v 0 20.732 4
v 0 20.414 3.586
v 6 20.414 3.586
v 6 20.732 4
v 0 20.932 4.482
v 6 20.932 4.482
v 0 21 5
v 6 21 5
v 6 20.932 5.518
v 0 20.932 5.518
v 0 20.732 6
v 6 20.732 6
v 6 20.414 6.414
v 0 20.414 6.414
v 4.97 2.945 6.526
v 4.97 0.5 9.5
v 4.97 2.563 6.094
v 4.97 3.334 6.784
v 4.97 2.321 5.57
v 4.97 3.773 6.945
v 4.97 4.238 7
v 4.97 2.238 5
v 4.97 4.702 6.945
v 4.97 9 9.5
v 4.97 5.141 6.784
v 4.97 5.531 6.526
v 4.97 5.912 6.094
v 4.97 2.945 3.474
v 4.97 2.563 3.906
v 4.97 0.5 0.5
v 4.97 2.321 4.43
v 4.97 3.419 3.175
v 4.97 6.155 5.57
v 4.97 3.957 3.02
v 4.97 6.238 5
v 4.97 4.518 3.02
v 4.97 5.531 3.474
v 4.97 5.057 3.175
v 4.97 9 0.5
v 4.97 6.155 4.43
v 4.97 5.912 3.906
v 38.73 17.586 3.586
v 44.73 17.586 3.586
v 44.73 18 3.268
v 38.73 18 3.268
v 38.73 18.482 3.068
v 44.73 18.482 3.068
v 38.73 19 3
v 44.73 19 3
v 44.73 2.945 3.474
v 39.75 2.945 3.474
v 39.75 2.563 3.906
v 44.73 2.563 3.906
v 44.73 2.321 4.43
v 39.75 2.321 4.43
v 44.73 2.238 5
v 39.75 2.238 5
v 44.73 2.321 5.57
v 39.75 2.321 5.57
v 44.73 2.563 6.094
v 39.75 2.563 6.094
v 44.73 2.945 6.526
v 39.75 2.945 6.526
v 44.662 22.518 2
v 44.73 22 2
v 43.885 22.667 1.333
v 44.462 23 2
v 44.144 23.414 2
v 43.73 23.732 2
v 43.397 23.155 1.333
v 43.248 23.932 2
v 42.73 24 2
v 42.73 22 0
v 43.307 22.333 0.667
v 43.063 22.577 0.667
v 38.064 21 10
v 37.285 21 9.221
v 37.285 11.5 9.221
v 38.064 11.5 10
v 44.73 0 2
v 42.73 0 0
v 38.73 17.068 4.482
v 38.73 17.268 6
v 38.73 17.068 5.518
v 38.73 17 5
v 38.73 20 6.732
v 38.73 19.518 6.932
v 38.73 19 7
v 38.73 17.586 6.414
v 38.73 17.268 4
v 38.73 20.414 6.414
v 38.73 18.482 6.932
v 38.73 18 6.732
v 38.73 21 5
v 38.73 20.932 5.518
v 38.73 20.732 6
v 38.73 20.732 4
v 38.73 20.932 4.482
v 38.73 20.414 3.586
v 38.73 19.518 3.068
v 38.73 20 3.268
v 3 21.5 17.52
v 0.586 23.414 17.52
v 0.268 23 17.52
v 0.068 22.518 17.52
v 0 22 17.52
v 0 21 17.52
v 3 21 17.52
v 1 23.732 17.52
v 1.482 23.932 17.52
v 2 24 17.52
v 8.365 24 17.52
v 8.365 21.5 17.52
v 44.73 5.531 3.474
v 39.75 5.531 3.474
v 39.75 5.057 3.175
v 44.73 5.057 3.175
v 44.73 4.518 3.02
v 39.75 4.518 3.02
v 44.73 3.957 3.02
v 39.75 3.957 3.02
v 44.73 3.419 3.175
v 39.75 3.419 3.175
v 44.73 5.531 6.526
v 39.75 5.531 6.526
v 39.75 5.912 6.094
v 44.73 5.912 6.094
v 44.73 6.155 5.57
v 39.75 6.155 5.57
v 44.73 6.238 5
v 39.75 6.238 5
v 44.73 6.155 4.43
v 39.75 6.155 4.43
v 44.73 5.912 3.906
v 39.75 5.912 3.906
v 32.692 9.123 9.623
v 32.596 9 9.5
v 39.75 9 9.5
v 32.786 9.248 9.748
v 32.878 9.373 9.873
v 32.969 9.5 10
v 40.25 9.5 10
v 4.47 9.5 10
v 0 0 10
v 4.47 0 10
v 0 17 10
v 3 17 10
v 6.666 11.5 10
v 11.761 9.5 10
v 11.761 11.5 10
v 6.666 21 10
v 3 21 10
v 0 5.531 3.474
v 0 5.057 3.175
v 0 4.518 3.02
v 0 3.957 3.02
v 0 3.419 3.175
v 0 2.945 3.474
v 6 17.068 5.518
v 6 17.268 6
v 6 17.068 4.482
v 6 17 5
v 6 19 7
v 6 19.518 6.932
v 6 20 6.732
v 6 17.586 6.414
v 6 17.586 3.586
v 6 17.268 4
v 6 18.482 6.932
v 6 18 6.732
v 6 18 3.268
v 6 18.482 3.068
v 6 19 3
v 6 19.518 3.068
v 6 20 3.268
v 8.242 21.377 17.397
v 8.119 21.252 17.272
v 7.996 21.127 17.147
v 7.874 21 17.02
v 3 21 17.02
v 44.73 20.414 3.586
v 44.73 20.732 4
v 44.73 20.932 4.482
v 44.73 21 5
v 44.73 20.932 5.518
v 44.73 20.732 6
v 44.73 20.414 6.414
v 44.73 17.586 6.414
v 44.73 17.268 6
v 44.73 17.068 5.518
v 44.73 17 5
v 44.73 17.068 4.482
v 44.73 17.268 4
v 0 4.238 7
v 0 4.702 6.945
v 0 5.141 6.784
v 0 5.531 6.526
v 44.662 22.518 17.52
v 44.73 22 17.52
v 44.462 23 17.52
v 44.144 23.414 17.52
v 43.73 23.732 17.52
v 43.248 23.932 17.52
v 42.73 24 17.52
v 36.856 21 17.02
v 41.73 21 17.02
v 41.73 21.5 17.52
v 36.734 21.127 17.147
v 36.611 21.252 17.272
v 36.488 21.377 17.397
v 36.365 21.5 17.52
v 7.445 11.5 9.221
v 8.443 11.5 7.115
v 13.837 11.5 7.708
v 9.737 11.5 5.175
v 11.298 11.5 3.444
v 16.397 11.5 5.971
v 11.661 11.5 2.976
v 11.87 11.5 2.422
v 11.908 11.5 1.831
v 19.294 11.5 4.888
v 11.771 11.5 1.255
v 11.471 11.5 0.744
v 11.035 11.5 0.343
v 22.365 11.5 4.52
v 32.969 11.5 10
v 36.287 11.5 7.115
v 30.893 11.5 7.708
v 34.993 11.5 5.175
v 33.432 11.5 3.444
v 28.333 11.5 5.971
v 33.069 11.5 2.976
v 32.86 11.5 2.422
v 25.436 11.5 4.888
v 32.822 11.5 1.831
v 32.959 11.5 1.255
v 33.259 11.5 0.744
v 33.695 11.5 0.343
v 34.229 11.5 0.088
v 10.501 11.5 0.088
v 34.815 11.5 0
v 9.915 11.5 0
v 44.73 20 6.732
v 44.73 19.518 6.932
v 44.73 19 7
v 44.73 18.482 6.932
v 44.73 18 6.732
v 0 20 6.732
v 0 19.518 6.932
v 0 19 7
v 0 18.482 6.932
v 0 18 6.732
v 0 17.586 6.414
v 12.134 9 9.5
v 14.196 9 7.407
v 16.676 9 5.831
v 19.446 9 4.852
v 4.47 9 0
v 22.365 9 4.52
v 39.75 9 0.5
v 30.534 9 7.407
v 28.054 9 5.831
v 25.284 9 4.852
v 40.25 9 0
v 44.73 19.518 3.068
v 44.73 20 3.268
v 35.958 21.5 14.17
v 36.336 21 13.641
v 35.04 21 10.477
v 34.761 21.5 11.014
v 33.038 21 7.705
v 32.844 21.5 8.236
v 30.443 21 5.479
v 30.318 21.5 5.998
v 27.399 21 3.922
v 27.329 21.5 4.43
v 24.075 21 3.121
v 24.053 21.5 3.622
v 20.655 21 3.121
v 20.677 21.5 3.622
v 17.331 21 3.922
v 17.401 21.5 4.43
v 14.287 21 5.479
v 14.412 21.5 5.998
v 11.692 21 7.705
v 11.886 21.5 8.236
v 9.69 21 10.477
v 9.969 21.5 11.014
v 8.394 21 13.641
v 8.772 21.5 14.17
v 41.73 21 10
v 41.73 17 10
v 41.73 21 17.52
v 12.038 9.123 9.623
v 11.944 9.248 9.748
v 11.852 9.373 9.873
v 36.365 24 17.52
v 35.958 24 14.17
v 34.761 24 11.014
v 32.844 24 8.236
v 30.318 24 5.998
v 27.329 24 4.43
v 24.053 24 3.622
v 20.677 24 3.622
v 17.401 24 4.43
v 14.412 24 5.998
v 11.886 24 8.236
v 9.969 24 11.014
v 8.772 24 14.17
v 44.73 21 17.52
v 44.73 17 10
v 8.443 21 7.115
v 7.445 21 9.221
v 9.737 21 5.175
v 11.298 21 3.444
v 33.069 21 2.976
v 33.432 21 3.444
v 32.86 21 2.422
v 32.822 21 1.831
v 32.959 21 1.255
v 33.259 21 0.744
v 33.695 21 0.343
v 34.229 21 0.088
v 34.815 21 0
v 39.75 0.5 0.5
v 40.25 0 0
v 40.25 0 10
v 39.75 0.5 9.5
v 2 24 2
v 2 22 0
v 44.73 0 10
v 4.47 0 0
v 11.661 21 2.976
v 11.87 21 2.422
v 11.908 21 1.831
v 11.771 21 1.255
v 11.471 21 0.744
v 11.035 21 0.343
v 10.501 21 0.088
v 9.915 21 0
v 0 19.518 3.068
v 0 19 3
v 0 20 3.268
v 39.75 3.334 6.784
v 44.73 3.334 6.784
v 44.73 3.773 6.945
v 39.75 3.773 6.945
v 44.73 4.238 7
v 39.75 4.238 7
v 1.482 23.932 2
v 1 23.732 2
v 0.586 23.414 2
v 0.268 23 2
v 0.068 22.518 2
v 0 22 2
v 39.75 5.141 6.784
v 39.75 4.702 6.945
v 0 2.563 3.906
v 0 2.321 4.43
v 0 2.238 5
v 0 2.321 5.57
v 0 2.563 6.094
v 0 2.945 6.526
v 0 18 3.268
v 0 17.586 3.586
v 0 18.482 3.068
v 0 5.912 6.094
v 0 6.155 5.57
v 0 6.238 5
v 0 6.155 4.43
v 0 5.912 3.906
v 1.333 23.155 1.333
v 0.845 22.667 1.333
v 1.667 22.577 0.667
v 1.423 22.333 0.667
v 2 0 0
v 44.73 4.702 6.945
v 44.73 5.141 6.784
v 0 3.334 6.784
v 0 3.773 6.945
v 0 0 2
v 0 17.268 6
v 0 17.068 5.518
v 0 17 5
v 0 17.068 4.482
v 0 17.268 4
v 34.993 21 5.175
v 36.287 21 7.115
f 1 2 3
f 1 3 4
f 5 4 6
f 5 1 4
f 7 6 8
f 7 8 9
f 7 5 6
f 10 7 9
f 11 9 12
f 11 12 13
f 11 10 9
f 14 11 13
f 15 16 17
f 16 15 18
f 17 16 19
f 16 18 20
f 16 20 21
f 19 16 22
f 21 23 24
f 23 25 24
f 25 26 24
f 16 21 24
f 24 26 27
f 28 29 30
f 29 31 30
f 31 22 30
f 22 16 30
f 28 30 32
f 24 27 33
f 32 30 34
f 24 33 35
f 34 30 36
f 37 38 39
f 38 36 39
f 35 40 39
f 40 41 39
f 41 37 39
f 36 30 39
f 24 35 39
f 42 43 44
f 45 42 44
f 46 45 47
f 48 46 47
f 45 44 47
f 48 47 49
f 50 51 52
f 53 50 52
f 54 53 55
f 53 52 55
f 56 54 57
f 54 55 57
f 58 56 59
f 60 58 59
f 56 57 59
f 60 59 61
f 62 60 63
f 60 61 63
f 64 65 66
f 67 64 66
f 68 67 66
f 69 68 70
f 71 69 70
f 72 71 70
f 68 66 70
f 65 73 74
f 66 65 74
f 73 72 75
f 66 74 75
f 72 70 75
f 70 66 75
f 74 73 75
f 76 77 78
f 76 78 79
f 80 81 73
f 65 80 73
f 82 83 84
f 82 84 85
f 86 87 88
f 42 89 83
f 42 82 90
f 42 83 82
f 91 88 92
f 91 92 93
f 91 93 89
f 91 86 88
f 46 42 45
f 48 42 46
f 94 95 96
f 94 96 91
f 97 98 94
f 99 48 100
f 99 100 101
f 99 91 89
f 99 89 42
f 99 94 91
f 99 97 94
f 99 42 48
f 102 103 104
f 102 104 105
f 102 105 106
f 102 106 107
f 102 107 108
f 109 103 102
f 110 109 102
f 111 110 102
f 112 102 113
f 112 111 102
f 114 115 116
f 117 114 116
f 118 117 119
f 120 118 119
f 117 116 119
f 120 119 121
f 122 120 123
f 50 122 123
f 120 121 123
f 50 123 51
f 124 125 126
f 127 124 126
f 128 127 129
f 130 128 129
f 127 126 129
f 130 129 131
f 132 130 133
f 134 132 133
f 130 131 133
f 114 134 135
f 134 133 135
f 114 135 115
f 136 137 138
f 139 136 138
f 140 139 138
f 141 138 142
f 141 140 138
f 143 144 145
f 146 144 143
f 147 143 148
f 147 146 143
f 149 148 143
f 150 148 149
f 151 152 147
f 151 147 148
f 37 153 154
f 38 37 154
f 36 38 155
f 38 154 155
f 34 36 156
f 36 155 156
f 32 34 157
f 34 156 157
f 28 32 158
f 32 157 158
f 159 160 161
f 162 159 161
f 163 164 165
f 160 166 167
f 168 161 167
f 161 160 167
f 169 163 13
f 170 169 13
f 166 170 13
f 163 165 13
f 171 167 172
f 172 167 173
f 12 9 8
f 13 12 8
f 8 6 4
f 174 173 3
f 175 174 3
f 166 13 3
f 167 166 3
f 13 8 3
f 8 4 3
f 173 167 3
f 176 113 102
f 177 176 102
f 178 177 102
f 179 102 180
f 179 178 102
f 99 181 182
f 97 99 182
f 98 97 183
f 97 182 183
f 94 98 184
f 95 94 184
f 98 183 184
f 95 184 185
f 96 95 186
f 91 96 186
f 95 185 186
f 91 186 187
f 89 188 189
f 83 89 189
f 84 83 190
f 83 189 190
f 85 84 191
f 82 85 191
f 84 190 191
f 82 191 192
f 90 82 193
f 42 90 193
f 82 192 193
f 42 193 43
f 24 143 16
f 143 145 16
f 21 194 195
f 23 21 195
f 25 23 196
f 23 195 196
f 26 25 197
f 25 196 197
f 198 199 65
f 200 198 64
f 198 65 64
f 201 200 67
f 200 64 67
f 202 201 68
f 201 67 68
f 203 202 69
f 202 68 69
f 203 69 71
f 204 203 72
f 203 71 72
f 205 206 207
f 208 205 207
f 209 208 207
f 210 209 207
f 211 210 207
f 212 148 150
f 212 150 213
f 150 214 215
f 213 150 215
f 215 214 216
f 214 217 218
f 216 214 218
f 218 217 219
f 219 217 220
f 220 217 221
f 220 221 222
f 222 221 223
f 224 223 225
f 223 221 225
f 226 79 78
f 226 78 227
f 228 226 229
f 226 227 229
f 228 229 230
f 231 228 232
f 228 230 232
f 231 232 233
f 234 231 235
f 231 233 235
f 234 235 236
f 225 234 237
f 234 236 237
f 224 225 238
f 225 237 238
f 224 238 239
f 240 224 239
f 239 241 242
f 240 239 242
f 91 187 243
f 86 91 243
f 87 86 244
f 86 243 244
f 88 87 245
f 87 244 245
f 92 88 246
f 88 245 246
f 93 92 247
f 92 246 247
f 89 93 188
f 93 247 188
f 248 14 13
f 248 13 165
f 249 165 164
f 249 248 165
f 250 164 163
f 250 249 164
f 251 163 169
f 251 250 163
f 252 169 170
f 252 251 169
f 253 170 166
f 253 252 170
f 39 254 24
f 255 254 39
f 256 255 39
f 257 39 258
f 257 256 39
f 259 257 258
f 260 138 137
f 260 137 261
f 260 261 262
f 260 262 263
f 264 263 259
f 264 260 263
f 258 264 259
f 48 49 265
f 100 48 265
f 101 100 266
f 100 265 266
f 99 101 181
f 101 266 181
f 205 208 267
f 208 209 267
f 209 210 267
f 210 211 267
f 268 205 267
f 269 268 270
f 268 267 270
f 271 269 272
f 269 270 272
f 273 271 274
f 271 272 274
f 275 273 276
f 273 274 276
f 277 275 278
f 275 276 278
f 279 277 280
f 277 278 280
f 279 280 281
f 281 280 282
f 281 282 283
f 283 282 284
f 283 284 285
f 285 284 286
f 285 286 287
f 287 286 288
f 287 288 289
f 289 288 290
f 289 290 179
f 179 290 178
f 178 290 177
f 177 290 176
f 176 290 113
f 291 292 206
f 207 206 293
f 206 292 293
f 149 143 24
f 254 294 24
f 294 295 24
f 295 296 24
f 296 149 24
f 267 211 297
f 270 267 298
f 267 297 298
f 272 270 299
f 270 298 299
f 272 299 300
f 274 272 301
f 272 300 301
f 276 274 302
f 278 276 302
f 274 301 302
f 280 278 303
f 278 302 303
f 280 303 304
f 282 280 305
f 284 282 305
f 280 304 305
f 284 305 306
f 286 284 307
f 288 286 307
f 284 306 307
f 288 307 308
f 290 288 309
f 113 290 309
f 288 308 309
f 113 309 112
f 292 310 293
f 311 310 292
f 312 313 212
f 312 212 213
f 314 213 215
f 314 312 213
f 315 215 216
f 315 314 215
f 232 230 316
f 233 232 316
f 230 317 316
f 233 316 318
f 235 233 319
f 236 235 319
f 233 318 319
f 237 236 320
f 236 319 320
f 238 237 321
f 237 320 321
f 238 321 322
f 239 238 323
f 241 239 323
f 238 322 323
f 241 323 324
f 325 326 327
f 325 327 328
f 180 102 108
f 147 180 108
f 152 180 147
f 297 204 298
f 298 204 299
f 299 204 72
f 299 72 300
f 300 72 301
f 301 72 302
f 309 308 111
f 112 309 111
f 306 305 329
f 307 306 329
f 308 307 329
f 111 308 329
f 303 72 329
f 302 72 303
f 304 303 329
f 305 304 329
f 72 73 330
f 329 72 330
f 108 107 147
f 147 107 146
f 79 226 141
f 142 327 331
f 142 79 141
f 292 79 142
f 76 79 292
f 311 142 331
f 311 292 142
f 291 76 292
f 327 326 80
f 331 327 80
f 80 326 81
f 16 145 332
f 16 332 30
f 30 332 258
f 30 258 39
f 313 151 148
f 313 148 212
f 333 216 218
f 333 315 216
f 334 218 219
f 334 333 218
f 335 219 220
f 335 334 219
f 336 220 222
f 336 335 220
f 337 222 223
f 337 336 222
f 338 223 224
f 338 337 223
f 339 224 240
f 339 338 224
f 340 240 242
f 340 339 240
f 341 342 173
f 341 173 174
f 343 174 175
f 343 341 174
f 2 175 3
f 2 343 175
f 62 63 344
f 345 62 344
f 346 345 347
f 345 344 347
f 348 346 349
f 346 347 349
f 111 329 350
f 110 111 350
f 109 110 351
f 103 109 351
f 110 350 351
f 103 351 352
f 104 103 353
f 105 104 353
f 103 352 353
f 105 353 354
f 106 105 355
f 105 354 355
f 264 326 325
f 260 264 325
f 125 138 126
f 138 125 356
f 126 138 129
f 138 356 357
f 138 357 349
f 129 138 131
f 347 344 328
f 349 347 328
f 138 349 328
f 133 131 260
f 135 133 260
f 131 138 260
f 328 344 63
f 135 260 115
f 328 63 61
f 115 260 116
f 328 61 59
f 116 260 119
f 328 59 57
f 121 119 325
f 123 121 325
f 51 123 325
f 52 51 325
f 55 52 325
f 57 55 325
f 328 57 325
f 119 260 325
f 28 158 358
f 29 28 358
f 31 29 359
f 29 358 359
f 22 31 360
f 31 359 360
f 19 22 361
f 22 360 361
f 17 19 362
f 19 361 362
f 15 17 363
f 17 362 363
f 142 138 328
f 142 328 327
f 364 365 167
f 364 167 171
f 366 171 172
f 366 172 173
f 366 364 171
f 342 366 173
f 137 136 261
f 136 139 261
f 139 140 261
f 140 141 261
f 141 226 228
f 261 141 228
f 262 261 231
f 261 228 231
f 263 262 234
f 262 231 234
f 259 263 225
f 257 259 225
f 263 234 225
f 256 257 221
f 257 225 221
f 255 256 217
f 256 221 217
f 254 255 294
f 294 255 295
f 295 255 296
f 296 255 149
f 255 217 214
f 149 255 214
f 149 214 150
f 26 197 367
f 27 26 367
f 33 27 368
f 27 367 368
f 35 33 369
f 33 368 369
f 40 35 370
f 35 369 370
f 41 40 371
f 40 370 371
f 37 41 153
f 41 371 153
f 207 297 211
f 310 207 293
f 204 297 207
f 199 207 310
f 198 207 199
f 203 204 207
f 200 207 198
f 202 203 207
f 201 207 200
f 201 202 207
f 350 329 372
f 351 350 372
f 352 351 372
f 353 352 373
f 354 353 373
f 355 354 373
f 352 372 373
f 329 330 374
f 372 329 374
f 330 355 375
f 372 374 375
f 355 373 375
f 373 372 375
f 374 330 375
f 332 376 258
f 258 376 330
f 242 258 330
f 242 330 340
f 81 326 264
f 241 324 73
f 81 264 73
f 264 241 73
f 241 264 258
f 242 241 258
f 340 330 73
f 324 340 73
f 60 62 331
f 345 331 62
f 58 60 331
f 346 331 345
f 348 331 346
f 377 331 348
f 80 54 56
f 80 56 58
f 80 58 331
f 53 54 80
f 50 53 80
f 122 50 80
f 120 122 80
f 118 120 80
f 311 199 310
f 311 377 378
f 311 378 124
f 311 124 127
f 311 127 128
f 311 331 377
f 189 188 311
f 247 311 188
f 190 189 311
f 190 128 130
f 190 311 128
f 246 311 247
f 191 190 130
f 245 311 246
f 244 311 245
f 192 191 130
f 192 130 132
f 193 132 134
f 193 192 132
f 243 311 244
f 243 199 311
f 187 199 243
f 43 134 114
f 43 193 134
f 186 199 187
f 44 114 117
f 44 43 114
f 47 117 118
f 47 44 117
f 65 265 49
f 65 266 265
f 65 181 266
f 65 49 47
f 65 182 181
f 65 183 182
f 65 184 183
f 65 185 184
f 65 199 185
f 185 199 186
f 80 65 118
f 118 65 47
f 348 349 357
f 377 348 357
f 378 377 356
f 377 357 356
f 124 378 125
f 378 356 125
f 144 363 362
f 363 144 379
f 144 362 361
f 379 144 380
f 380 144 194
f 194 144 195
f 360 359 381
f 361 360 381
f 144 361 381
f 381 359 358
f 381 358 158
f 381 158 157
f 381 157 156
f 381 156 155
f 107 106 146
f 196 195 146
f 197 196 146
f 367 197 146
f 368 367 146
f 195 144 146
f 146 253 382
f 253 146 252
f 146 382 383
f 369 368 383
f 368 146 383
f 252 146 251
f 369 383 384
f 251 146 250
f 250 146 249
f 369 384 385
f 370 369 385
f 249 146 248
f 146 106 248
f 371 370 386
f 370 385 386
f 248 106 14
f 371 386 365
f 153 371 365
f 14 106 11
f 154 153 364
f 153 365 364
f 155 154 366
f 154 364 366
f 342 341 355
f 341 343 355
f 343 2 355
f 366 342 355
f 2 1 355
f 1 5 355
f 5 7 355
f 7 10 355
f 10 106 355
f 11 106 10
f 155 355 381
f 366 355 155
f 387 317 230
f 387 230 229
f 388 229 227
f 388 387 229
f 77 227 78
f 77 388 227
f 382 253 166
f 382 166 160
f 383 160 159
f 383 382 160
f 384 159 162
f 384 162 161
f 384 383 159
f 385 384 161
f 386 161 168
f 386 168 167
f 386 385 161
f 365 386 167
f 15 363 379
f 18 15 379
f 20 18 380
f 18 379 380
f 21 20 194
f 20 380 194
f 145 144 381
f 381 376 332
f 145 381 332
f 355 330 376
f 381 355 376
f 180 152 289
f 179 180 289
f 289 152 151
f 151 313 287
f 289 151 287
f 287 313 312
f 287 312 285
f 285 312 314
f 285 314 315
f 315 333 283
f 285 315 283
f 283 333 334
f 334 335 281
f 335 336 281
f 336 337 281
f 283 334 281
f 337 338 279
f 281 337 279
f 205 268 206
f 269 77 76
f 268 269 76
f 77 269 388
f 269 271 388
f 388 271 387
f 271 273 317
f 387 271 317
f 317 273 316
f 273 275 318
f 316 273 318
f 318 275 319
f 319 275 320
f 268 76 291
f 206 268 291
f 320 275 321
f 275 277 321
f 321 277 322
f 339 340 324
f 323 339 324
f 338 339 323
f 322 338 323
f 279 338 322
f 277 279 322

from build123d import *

# Parameters (mm, degrees)
EXTRUDE_1_DEPTH     = 10
SKETCH_2_W          = 16
SKETCH_2_H          = 9.5
EXTRUDE_2_DEPTH     = 17.52
CUT_EXTRUDE_1_DEPTH = 3
CUT_EXTRUDE_2_DEPTH = 2.5
EXTRUDE_3_DEPTH     = 3
EXTRUDE_4_DEPTH     = 3
FILLET_1_R          = 2
CHAMFER_1_SIZE      = 2
CUT_EXTRUDE_3_DEPTH = 6
CUT_EXTRUDE_4_REACH = 55.7
CHAMFER_2_SIZE      = 0.5
FILLET_2_R          = 2


# Some blends are built 0.0001 mm under size
with BuildPart() as part:
    # 草图1 → 凸台-拉伸1 (new body)
    with BuildSketch(Plane.XY):
        Polygon((0, 0), (4.97, 0), (4.97, 9), (39.75, 9), (39.75, 0), (44.73, 0), (44.73, 24), (0, 24), align=None)
    extrude(amount=EXTRUDE_1_DEPTH)

    # 草图2 → 切除-旋转2 (revolve, cut)
    with BuildSketch(Plane(origin=(0, 0, 15), x_dir=(-1, 0, 0), z_dir=(0, 0, -1))):
        with Locations((-14.365, 16.25)):
            Rectangle(SKETCH_2_W, SKETCH_2_H)
    revolve(axis=Axis((22.365, 28.168186047, 15), (0, -1, 0)), mode=Mode.SUBTRACT)

    # 草图4 → 凸台-拉伸2 (add)
    with BuildSketch(Plane(origin=(0, 0, 0), x_dir=(-1, 0, 0), z_dir=(0, 0, -1))):
        Polygon((-44.73, 24), (0, 24), (0, 21), (-7.166315846, 21), (-37.563684154, 21), (-44.73, 21), align=None)
    extrude(amount=-EXTRUDE_2_DEPTH)

    # 草图5 → 切除-拉伸1 (cut)
    with BuildSketch(Plane(origin=(0, 24, 0), x_dir=(1, 0, 0), z_dir=(0, 1, 0))):
        with BuildLine():
            Line((8.365, -17.52), (36.365, -17.52))
            ThreePointArc((36.365, -17.52), (22.365, -3.52), (8.365, -17.52))
        make_face()
    extrude(amount=-CUT_EXTRUDE_1_DEPTH, mode=Mode.SUBTRACT)

    # 草图6 → 切除-拉伸2 (cut)
    with BuildSketch(Plane(origin=(0, 11.5, 0), x_dir=(1, 0, 0), z_dir=(0, 1, 0))):
        with BuildLine():
            ThreePointArc((32.969225573, -10), (22.365, -4.52), (11.760774427, -10))
            Line((11.760774427, -10), (32.969225573, -10))
        make_face()
    extrude(amount=-CUT_EXTRUDE_2_DEPTH, mode=Mode.SUBTRACT)

    # 草图7 → 凸台-拉伸3 (add)
    with BuildSketch(Plane.ZY):
        Polygon((10, 17), (10, 21), (17.52, 21), align=None)
    extrude(amount=-EXTRUDE_3_DEPTH)

    # 草图8 → 凸台-拉伸4 (add)
    with BuildSketch(Plane(origin=(44.73, 0, 0), x_dir=(0, 0, -1), z_dir=(1, 0, 0))):
        Polygon((-17.52, 21), (-10, 17), (-10, 21), align=None)
    extrude(amount=-EXTRUDE_4_DEPTH)

    # 圆角1
    fillet_1_edges = [part.edges().sort_by_distance(p)[0] for p in [
        (0, 24, 8.76),
        (44.73, 24, 8.76),
    ]]
    fillet(fillet_1_edges, radius=FILLET_1_R)

    # 倒角1
    chamfer_1_edges = [part.edges().sort_by_distance(p)[0] for p in [
        (22.365, 24, 0),
        (0, 11, 0),
        (0.585786438, 23.414213562, 0),
        (44.144213562, 23.414213562, 0),
        (44.73, 11, 0),
    ]]
    chamfer(chamfer_1_edges, length=CHAMFER_1_SIZE - 0.0001)  # a hair under: the kernel refuses the full size

    # 草图9 → 切除-拉伸3 (cut)
    with BuildSketch(Plane(origin=(44.73, 0, 0), x_dir=(0, 0, -1), z_dir=(1, 0, 0))):
        with BuildLine():
            ThreePointArc((-6.414213562, 17.585786438), (-5, 17), (-3.585786438, 17.585786438))
            Line((-3.585786438, 17.585786438), (-5, 19))
            Line((-5, 19), (-6.414213562, 17.585786438))
        make_face()
        with BuildLine():
            Line((-5, 19), (-3.585786438, 17.585786438))
            ThreePointArc((-3.585786438, 17.585786438), (-3.152240935, 18.234633135), (-3, 19))
            ThreePointArc((-3, 19), (-3.152240935, 19.765366865), (-3.585786438, 20.414213562))
            Line((-3.585786438, 20.414213562), (-5, 19))
        make_face()
        with BuildLine():
            ThreePointArc((-6.414213562, 20.414213562), (-7, 19), (-6.414213562, 17.585786438))
            Line((-6.414213562, 17.585786438), (-5, 19))
            Line((-5, 19), (-6.414213562, 20.414213562))
        make_face()
        with BuildLine():
            Line((-6.414213562, 20.414213562), (-5, 19))
            Line((-5, 19), (-3.585786438, 20.414213562))
            ThreePointArc((-3.585786438, 20.414213562), (-5, 21), (-6.414213562, 20.414213562))
        make_face()
    cut_extrude_3 = extrude(amount=-CUT_EXTRUDE_3_DEPTH, mode=Mode.SUBTRACT)

    # 镜向1: 切除-拉伸3 across plane
    add(cut_extrude_3.mirror(Plane(origin=(22.365, 0, 0), x_dir=(0, 0, 1), z_dir=(1, 0, 0))), mode=Mode.SUBTRACT)

    # 切除-拉伸4: up to this face of the body (flat: up to its plane)
    cut_extrude_4_end = Plane(part.part.faces().sort_by_distance((44.73, 11.584828714, 6.907402267))[0])
    # 草图10 → 切除-拉伸4 (cut, up to the picked face)
    with BuildSketch(Plane.ZY, mode=Mode.PRIVATE) as cut_extrude_4_sk1:
        with BuildLine():
            ThreePointArc((3.474277506, 2.944620168), (5, 2.237744629), (6.525722494, 2.944620168))
            Line((6.525722494, 2.944620168), (5, 4.237744629))
            Line((5, 4.237744629), (3.474277506, 2.944620168))
        make_face()
    cut_extrude_4_tool1 = split(extrude(cut_extrude_4_sk1.sketch, amount=-CUT_EXTRUDE_4_REACH, mode=Mode.PRIVATE), bisect_by=cut_extrude_4_end, keep=Keep.BOTH, mode=Mode.PRIVATE)
    # 草图10 → 切除-拉伸4 (cut, up to the picked face)
    with BuildSketch(Plane.ZY, mode=Mode.PRIVATE) as cut_extrude_4_sk2:
        with BuildLine():
            Line((5, 4.237744629), (6.525722494, 2.944620168))
            ThreePointArc((6.525722494, 2.944620168), (6.877690734, 3.549066543), (7, 4.237744629))
            ThreePointArc((7, 4.237744629), (6.877690734, 4.926422715), (6.525722494, 5.53086909))
            Line((6.525722494, 5.53086909), (5, 4.237744629))
        make_face()
    cut_extrude_4_tool2 = split(extrude(cut_extrude_4_sk2.sketch, amount=-CUT_EXTRUDE_4_REACH, mode=Mode.PRIVATE), bisect_by=cut_extrude_4_end, keep=Keep.BOTH, mode=Mode.PRIVATE)
    # 草图10 → 切除-拉伸4 (cut, up to the picked face)
    with BuildSketch(Plane.ZY, mode=Mode.PRIVATE) as cut_extrude_4_sk3:
        with BuildLine():
            ThreePointArc((3.474277506, 5.53086909), (3, 4.237744629), (3.474277506, 2.944620168))
            Line((3.474277506, 2.944620168), (5, 4.237744629))
            Line((5, 4.237744629), (3.474277506, 5.53086909))
        make_face()
    cut_extrude_4_tool3 = split(extrude(cut_extrude_4_sk3.sketch, amount=-CUT_EXTRUDE_4_REACH, mode=Mode.PRIVATE), bisect_by=cut_extrude_4_end, keep=Keep.BOTH, mode=Mode.PRIVATE)
    # 草图10 → 切除-拉伸4 (cut, up to the picked face)
    with BuildSketch(Plane.ZY, mode=Mode.PRIVATE) as cut_extrude_4_sk4:
        with BuildLine():
            Line((5, 4.237744629), (6.525722494, 5.53086909))
            ThreePointArc((6.525722494, 5.53086909), (5, 6.237744629), (3.474277506, 5.53086909))
            Line((3.474277506, 5.53086909), (5, 4.237744629))
        make_face()
    cut_extrude_4_tool4 = split(extrude(cut_extrude_4_sk4.sketch, amount=-CUT_EXTRUDE_4_REACH, mode=Mode.PRIVATE), bisect_by=cut_extrude_4_end, keep=Keep.BOTH, mode=Mode.PRIVATE)
    # 草图10 → 切除-拉伸4 (cut, up to the picked face)
    with BuildSketch(Plane.ZY, mode=Mode.PRIVATE) as cut_extrude_4_sk5:
        with BuildLine():
            ThreePointArc((3.474277506, 2.944620168), (5, 2.237744629), (6.525722494, 2.944620168))
            Line((6.525722494, 2.944620168), (5, 4.237744629))
            Line((5, 4.237744629), (3.474277506, 2.944620168))
        make_face()
    cut_extrude_4_tool5 = split(extrude(cut_extrude_4_sk5.sketch, amount=-CUT_EXTRUDE_4_REACH, mode=Mode.PRIVATE), bisect_by=cut_extrude_4_end, keep=Keep.BOTH, mode=Mode.PRIVATE)
    # 草图10 → 切除-拉伸4 (cut, up to the picked face)
    with BuildSketch(Plane.ZY, mode=Mode.PRIVATE) as cut_extrude_4_sk6:
        with BuildLine():
            Line((5, 4.237744629), (6.525722494, 2.944620168))
            ThreePointArc((6.525722494, 2.944620168), (6.877690734, 3.549066543), (7, 4.237744629))
            ThreePointArc((7, 4.237744629), (6.877690734, 4.926422715), (6.525722494, 5.53086909))
            Line((6.525722494, 5.53086909), (5, 4.237744629))
        make_face()
    cut_extrude_4_tool6 = split(extrude(cut_extrude_4_sk6.sketch, amount=-CUT_EXTRUDE_4_REACH, mode=Mode.PRIVATE), bisect_by=cut_extrude_4_end, keep=Keep.BOTH, mode=Mode.PRIVATE)
    # 草图10 → 切除-拉伸4 (cut, up to the picked face)
    with BuildSketch(Plane.ZY, mode=Mode.PRIVATE) as cut_extrude_4_sk7:
        with BuildLine():
            ThreePointArc((3.474277506, 5.53086909), (3, 4.237744629), (3.474277506, 2.944620168))
            Line((3.474277506, 2.944620168), (5, 4.237744629))
            Line((5, 4.237744629), (3.474277506, 5.53086909))
        make_face()
    cut_extrude_4_tool7 = split(extrude(cut_extrude_4_sk7.sketch, amount=-CUT_EXTRUDE_4_REACH, mode=Mode.PRIVATE), bisect_by=cut_extrude_4_end, keep=Keep.BOTH, mode=Mode.PRIVATE)
    # 草图10 → 切除-拉伸4 (cut, up to the picked face)
    with BuildSketch(Plane.ZY, mode=Mode.PRIVATE) as cut_extrude_4_sk8:
        with BuildLine():
            Line((5, 4.237744629), (6.525722494, 5.53086909))
            ThreePointArc((6.525722494, 5.53086909), (5, 6.237744629), (3.474277506, 5.53086909))
            Line((3.474277506, 5.53086909), (5, 4.237744629))
        make_face()
    cut_extrude_4_tool8 = split(extrude(cut_extrude_4_sk8.sketch, amount=-CUT_EXTRUDE_4_REACH, mode=Mode.PRIVATE), bisect_by=cut_extrude_4_end, keep=Keep.BOTH, mode=Mode.PRIVATE)
    # 草图10 → 切除-拉伸4 (cut, up to the picked face)
    with BuildSketch(Plane.ZY, mode=Mode.PRIVATE) as cut_extrude_4_sk9:
        with BuildLine():
            ThreePointArc((3.474277506, 2.944620168), (5, 2.237744629), (6.525722494, 2.944620168))
            Line((6.525722494, 2.944620168), (5, 4.237744629))
            Line((5, 4.237744629), (3.474277506, 2.944620168))
        make_face()
    cut_extrude_4_tool9 = split(extrude(cut_extrude_4_sk9.sketch, amount=-CUT_EXTRUDE_4_REACH, mode=Mode.PRIVATE), bisect_by=cut_extrude_4_end, keep=Keep.BOTH, mode=Mode.PRIVATE)
    # 草图10 → 切除-拉伸4 (cut, up to the picked face)
    with BuildSketch(Plane.ZY, mode=Mode.PRIVATE) as cut_extrude_4_sk10:
        with BuildLine():
            Line((5, 4.237744629), (6.525722494, 2.944620168))
            ThreePointArc((6.525722494, 2.944620168), (6.877690734, 3.549066543), (7, 4.237744629))
            ThreePointArc((7, 4.237744629), (6.877690734, 4.926422715), (6.525722494, 5.53086909))
            Line((6.525722494, 5.53086909), (5, 4.237744629))
        make_face()
    cut_extrude_4_tool10 = split(extrude(cut_extrude_4_sk10.sketch, amount=-CUT_EXTRUDE_4_REACH, mode=Mode.PRIVATE), bisect_by=cut_extrude_4_end, keep=Keep.BOTH, mode=Mode.PRIVATE)
    # 草图10 → 切除-拉伸4 (cut, up to the picked face)
    with BuildSketch(Plane.ZY, mode=Mode.PRIVATE) as cut_extrude_4_sk11:
        with BuildLine():
            ThreePointArc((3.474277506, 5.53086909), (3, 4.237744629), (3.474277506, 2.944620168))
            Line((3.474277506, 2.944620168), (5, 4.237744629))
            Line((5, 4.237744629), (3.474277506, 5.53086909))
        make_face()
    cut_extrude_4_tool11 = split(extrude(cut_extrude_4_sk11.sketch, amount=-CUT_EXTRUDE_4_REACH, mode=Mode.PRIVATE), bisect_by=cut_extrude_4_end, keep=Keep.BOTH, mode=Mode.PRIVATE)
    # 草图10 → 切除-拉伸4 (cut, up to the picked face)
    with BuildSketch(Plane.ZY, mode=Mode.PRIVATE) as cut_extrude_4_sk12:
        with BuildLine():
            Line((5, 4.237744629), (6.525722494, 5.53086909))
            ThreePointArc((6.525722494, 5.53086909), (5, 6.237744629), (3.474277506, 5.53086909))
            Line((3.474277506, 5.53086909), (5, 4.237744629))
        make_face()
    cut_extrude_4_tool12 = split(extrude(cut_extrude_4_sk12.sketch, amount=-CUT_EXTRUDE_4_REACH, mode=Mode.PRIVATE), bisect_by=cut_extrude_4_end, keep=Keep.BOTH, mode=Mode.PRIVATE)
    # 草图10 → 切除-拉伸4 (cut, up to the picked face)
    with BuildSketch(Plane.ZY, mode=Mode.PRIVATE) as cut_extrude_4_sk13:
        with BuildLine():
            ThreePointArc((3.474277506, 2.944620168), (5, 2.237744629), (6.525722494, 2.944620168))
            Line((6.525722494, 2.944620168), (5, 4.237744629))
            Line((5, 4.237744629), (3.474277506, 2.944620168))
        make_face()
    cut_extrude_4_tool13 = split(extrude(cut_extrude_4_sk13.sketch, amount=-CUT_EXTRUDE_4_REACH, mode=Mode.PRIVATE), bisect_by=cut_extrude_4_end, keep=Keep.BOTH, mode=Mode.PRIVATE)
    # 草图10 → 切除-拉伸4 (cut, up to the picked face)
    with BuildSketch(Plane.ZY, mode=Mode.PRIVATE) as cut_extrude_4_sk14:
        with BuildLine():
            Line((5, 4.237744629), (6.525722494, 2.944620168))
            ThreePointArc((6.525722494, 2.944620168), (6.877690734, 3.549066543), (7, 4.237744629))
            ThreePointArc((7, 4.237744629), (6.877690734, 4.926422715), (6.525722494, 5.53086909))
            Line((6.525722494, 5.53086909), (5, 4.237744629))
        make_face()
    cut_extrude_4_tool14 = split(extrude(cut_extrude_4_sk14.sketch, amount=-CUT_EXTRUDE_4_REACH, mode=Mode.PRIVATE), bisect_by=cut_extrude_4_end, keep=Keep.BOTH, mode=Mode.PRIVATE)
    # 草图10 → 切除-拉伸4 (cut, up to the picked face)
    with BuildSketch(Plane.ZY, mode=Mode.PRIVATE) as cut_extrude_4_sk15:
        with BuildLine():
            ThreePointArc((3.474277506, 5.53086909), (3, 4.237744629), (3.474277506, 2.944620168))
            Line((3.474277506, 2.944620168), (5, 4.237744629))
            Line((5, 4.237744629), (3.474277506, 5.53086909))
        make_face()
    cut_extrude_4_tool15 = split(extrude(cut_extrude_4_sk15.sketch, amount=-CUT_EXTRUDE_4_REACH, mode=Mode.PRIVATE), bisect_by=cut_extrude_4_end, keep=Keep.BOTH, mode=Mode.PRIVATE)
    # 草图10 → 切除-拉伸4 (cut, up to the picked face)
    with BuildSketch(Plane.ZY, mode=Mode.PRIVATE) as cut_extrude_4_sk16:
        with BuildLine():
            Line((5, 4.237744629), (6.525722494, 5.53086909))
            ThreePointArc((6.525722494, 5.53086909), (5, 6.237744629), (3.474277506, 5.53086909))
            Line((3.474277506, 5.53086909), (5, 4.237744629))
        make_face()
    cut_extrude_4_tool16 = split(extrude(cut_extrude_4_sk16.sketch, amount=-CUT_EXTRUDE_4_REACH, mode=Mode.PRIVATE), bisect_by=cut_extrude_4_end, keep=Keep.BOTH, mode=Mode.PRIVATE)
    add(cut_extrude_4_tool1.solids().sort_by(Axis((0, 3.065546, 5), (1, 0, 0)))[0], mode=Mode.SUBTRACT)
    add(cut_extrude_4_tool2.solids().sort_by(Axis((0, 4.237745, 6.226171), (1, 0, 0)))[0], mode=Mode.SUBTRACT)
    add(cut_extrude_4_tool3.solids().sort_by(Axis((0, 4.237745, 3.773829), (1, 0, 0)))[0], mode=Mode.SUBTRACT)
    add(cut_extrude_4_tool4.solids().sort_by(Axis((0, 5.409943, 5), (1, 0, 0)))[0], mode=Mode.SUBTRACT)
    add(cut_extrude_4_tool5.solids().sort_by(Axis((0, 3.065546, 5), (1, 0, 0)))[0], mode=Mode.SUBTRACT)
    add(cut_extrude_4_tool6.solids().sort_by(Axis((0, 4.237745, 6.226171), (1, 0, 0)))[0], mode=Mode.SUBTRACT)
    add(cut_extrude_4_tool7.solids().sort_by(Axis((0, 4.237745, 3.773829), (1, 0, 0)))[0], mode=Mode.SUBTRACT)
    add(cut_extrude_4_tool8.solids().sort_by(Axis((0, 5.409943, 5), (1, 0, 0)))[0], mode=Mode.SUBTRACT)
    add(cut_extrude_4_tool9.solids().sort_by(Axis((0, 3.065546, 5), (1, 0, 0)))[0], mode=Mode.SUBTRACT)
    add(cut_extrude_4_tool10.solids().sort_by(Axis((0, 4.237745, 6.226171), (1, 0, 0)))[0], mode=Mode.SUBTRACT)
    add(cut_extrude_4_tool11.solids().sort_by(Axis((0, 4.237745, 3.773829), (1, 0, 0)))[0], mode=Mode.SUBTRACT)
    add(cut_extrude_4_tool12.solids().sort_by(Axis((0, 5.409943, 5), (1, 0, 0)))[0], mode=Mode.SUBTRACT)
    add(cut_extrude_4_tool13.solids().sort_by(Axis((0, 3.065546, 5), (1, 0, 0)))[0], mode=Mode.SUBTRACT)
    add(cut_extrude_4_tool14.solids().sort_by(Axis((0, 4.237745, 6.226171), (1, 0, 0)))[0], mode=Mode.SUBTRACT)
    add(cut_extrude_4_tool15.solids().sort_by(Axis((0, 4.237745, 3.773829), (1, 0, 0)))[0], mode=Mode.SUBTRACT)
    add(cut_extrude_4_tool16.solids().sort_by(Axis((0, 5.409943, 5), (1, 0, 0)))[0], mode=Mode.SUBTRACT)

    # 倒角2
    # the kernel refuses this chamfer: 0.784414919, 0.5 mm, written as the material it takes off along each edge
    with BuildSketch(Plane(origin=(41.73, 21, 17.52), x_dir=(0, 0, -1), z_dir=(-1, 0, 0))) as chamfer_2_piece_1:
        Polygon((CHAMFER_2_SIZE, 0), (0, -CHAMFER_2_SIZE), (0, 0), align=None)
    extrude(amount=6.650841494, mode=Mode.SUBTRACT)
    with BuildSketch(Plane(origin=(4.97, -1.285841494, 0), x_dir=(-1, 0, 0), z_dir=(0, 1, 0)), Plane(origin=(39.75, 9, 10), x_dir=(0, 0, -1), z_dir=(0, -1, 0)), Plane(origin=(39.75, 9, 0), x_dir=(1, 0, 0), z_dir=(0, -1, 0))) as chamfer_2_piece_2:
        Polygon((CHAMFER_2_SIZE, 0), (0, CHAMFER_2_SIZE), (0, 0), align=None)
    extrude(amount=10.285841494, mode=Mode.SUBTRACT)
    with BuildSketch(Plane(origin=(4.97, -1.285841494, 10), x_dir=(-1, 0, 0), z_dir=(0, 1, 0))) as chamfer_2_piece_3:
        Polygon((CHAMFER_2_SIZE, 0), (0, -CHAMFER_2_SIZE), (0, 0), align=None)
    extrude(amount=10.285841494, mode=Mode.SUBTRACT)
    with BuildSketch(Plane(origin=(39.75, 0, -1.285841494), x_dir=(1, 0, 0), z_dir=(0, 0, 1))) as chamfer_2_piece_4:
        Polygon((CHAMFER_2_SIZE, 0), (0, CHAMFER_2_SIZE), (0, 0), align=None)
    extrude(amount=12.571682988, mode=Mode.SUBTRACT)
    with BuildSketch(Plane(origin=(4.97, 0, -1.285841494), x_dir=(-1, 0, 0), z_dir=(0, 0, 1))) as chamfer_2_piece_5:
        Polygon((CHAMFER_2_SIZE, 0), (0, -CHAMFER_2_SIZE), (0, 0), align=None)
    extrude(amount=12.571682988, mode=Mode.SUBTRACT)
    with BuildSketch(Plane(origin=(4.97, 9, 10), x_dir=(0, 1, 0), z_dir=(1, 0, 0))) as chamfer_2_piece_6:
        Polygon((CHAMFER_2_SIZE, 0), (0, -CHAMFER_2_SIZE), (0, 0), align=None)
    extrude(amount=8.076615921, mode=Mode.SUBTRACT)
    with BuildSketch(Plane(origin=(9.650841494, 21, 17.52), x_dir=(0, 1, 0), z_dir=(-1, 0, 0))) as chamfer_2_piece_7:
        Polygon((CHAMFER_2_SIZE, 0), (0, CHAMFER_2_SIZE), (0, 0), align=None)
    extrude(amount=6.650841494, mode=Mode.SUBTRACT)
    with BuildSketch(Plane(origin=(22.365, 21, 17.52), x_dir=(0.9957715788349903, 0, 0.09186382739942131), z_dir=(-0.09186382739942131, 0, 0.9957715788349903))) as chamfer_2_piece_8:
        Polygon((14 + CHAMFER_2_SIZE, 0), (14, CHAMFER_2_SIZE), (14, 0), align=None)
    revolve(axis=Axis((22.365, 21, 17.52), (0, 1, 0)), revolution_arc=190.541681616, mode=Mode.SUBTRACT)
    with BuildSketch(Plane(origin=(31.683384079, 9, 10), x_dir=(0, 0, -1), z_dir=(1, 0, 0))) as chamfer_2_piece_9:
        Polygon((CHAMFER_2_SIZE, 0), (0, CHAMFER_2_SIZE), (0, 0), align=None)
    extrude(amount=8.066615921, mode=Mode.SUBTRACT)
    with BuildSketch(Plane(origin=(37.563684154, 21, 10), x_dir=(-0.3369457278285583, 0, -0.941524071119843), z_dir=(0, -1, 0))) as chamfer_2_piece_10:
        with BuildLine():
            Line((0.827022677, 0), (-CHAMFER_2_SIZE * 0.336945727829, CHAMFER_2_SIZE * 0.94152407112))
            Line((-CHAMFER_2_SIZE * 0.336945727829, CHAMFER_2_SIZE * 0.94152407112), (0, 0))
            ThreePointArc((0, 0), (0.427704475, 0.005338086), (0.827022677, 0))
        make_face()
    extrude(amount=9.5, mode=Mode.SUBTRACT)
    with BuildSketch(Plane(origin=(7.166315846, 21, 10), x_dir=(-1, 0, 0), z_dir=(0, -1, 0))) as chamfer_2_piece_11:
        with BuildLine():
            Line((CHAMFER_2_SIZE, 0), (-0.278661758, 0.778661758))
            ThreePointArc((-0.278661758, 0.778661758), (-0.139087259, 0.404492704), (0, 0))
            Line((0, 0), (CHAMFER_2_SIZE, 0))
        make_face()
    extrude(amount=9.5, mode=Mode.SUBTRACT)
    with BuildSketch(Plane(origin=(3.684158506, 9, 10), x_dir=(0, 1, 0), z_dir=(1, 0, 0))) as chamfer_2_piece_12a_section:
        Polygon((CHAMFER_2_SIZE, 0), (0, -CHAMFER_2_SIZE), (0, 0), align=None)
    chamfer_2_piece_12a = extrude(amount=9.362457415, mode=Mode.PRIVATE)
    chamfer_2_piece_12a = split(chamfer_2_piece_12a, bisect_by=Plane(origin=(4.97, 9, 10), z_dir=(-1, 0, 0)), keep=Keep.TOP, mode=Mode.PRIVATE)
    with BuildSketch(Plane(origin=(4.97, 0, 10), x_dir=(-1, 0, 0), z_dir=(0, 1, 0))) as chamfer_2_piece_12b_section:
        Polygon((CHAMFER_2_SIZE, 0), (0, -CHAMFER_2_SIZE), (0, 0), align=None)
    chamfer_2_piece_12b = extrude(amount=10.285841494, mode=Mode.PRIVATE)
    chamfer_2_piece_12b = split(chamfer_2_piece_12b, bisect_by=Plane(origin=(4.97, 9, 10), z_dir=(0, 1, 0)), keep=Keep.TOP, mode=Mode.PRIVATE)
    chamfer_2_piece_12 = chamfer_2_piece_12a & chamfer_2_piece_12b
    add(chamfer_2_piece_12, mode=Mode.SUBTRACT)
    with BuildSketch(Plane(origin=(31.683384079, 9, 10), x_dir=(0, 0, -1), z_dir=(1, 0, 0))) as chamfer_2_piece_13a_section:
        Polygon((CHAMFER_2_SIZE, 0), (0, CHAMFER_2_SIZE), (0, 0), align=None)
    chamfer_2_piece_13a = extrude(amount=9.352457415, mode=Mode.PRIVATE)
    chamfer_2_piece_13a = split(chamfer_2_piece_13a, bisect_by=Plane(origin=(39.75, 9, 10), z_dir=(1, 0, 0)), keep=Keep.TOP, mode=Mode.PRIVATE)
    with BuildSketch(Plane(origin=(39.75, 10.285841494, 10), x_dir=(0, 0, -1), z_dir=(0, -1, 0))) as chamfer_2_piece_13b_section:
        Polygon((CHAMFER_2_SIZE, 0), (0, CHAMFER_2_SIZE), (0, 0), align=None)
    chamfer_2_piece_13b = extrude(amount=10.285841494, mode=Mode.PRIVATE)
    chamfer_2_piece_13b = split(chamfer_2_piece_13b, bisect_by=Plane(origin=(39.75, 9, 10), z_dir=(0, 1, 0)), keep=Keep.TOP, mode=Mode.PRIVATE)
    chamfer_2_piece_13 = chamfer_2_piece_13a & chamfer_2_piece_13b
    add(chamfer_2_piece_13, mode=Mode.SUBTRACT)

    # 圆角2
    fillet_2_edges = [part.edges().sort_by_distance(p)[0] for p in [
        (16.797235637, 16.25, 0),
        (27.932764363, 16.25, 0),
    ]]
    fillet(fillet_2_edges, radius=FILLET_2_R)


solid = part.part
